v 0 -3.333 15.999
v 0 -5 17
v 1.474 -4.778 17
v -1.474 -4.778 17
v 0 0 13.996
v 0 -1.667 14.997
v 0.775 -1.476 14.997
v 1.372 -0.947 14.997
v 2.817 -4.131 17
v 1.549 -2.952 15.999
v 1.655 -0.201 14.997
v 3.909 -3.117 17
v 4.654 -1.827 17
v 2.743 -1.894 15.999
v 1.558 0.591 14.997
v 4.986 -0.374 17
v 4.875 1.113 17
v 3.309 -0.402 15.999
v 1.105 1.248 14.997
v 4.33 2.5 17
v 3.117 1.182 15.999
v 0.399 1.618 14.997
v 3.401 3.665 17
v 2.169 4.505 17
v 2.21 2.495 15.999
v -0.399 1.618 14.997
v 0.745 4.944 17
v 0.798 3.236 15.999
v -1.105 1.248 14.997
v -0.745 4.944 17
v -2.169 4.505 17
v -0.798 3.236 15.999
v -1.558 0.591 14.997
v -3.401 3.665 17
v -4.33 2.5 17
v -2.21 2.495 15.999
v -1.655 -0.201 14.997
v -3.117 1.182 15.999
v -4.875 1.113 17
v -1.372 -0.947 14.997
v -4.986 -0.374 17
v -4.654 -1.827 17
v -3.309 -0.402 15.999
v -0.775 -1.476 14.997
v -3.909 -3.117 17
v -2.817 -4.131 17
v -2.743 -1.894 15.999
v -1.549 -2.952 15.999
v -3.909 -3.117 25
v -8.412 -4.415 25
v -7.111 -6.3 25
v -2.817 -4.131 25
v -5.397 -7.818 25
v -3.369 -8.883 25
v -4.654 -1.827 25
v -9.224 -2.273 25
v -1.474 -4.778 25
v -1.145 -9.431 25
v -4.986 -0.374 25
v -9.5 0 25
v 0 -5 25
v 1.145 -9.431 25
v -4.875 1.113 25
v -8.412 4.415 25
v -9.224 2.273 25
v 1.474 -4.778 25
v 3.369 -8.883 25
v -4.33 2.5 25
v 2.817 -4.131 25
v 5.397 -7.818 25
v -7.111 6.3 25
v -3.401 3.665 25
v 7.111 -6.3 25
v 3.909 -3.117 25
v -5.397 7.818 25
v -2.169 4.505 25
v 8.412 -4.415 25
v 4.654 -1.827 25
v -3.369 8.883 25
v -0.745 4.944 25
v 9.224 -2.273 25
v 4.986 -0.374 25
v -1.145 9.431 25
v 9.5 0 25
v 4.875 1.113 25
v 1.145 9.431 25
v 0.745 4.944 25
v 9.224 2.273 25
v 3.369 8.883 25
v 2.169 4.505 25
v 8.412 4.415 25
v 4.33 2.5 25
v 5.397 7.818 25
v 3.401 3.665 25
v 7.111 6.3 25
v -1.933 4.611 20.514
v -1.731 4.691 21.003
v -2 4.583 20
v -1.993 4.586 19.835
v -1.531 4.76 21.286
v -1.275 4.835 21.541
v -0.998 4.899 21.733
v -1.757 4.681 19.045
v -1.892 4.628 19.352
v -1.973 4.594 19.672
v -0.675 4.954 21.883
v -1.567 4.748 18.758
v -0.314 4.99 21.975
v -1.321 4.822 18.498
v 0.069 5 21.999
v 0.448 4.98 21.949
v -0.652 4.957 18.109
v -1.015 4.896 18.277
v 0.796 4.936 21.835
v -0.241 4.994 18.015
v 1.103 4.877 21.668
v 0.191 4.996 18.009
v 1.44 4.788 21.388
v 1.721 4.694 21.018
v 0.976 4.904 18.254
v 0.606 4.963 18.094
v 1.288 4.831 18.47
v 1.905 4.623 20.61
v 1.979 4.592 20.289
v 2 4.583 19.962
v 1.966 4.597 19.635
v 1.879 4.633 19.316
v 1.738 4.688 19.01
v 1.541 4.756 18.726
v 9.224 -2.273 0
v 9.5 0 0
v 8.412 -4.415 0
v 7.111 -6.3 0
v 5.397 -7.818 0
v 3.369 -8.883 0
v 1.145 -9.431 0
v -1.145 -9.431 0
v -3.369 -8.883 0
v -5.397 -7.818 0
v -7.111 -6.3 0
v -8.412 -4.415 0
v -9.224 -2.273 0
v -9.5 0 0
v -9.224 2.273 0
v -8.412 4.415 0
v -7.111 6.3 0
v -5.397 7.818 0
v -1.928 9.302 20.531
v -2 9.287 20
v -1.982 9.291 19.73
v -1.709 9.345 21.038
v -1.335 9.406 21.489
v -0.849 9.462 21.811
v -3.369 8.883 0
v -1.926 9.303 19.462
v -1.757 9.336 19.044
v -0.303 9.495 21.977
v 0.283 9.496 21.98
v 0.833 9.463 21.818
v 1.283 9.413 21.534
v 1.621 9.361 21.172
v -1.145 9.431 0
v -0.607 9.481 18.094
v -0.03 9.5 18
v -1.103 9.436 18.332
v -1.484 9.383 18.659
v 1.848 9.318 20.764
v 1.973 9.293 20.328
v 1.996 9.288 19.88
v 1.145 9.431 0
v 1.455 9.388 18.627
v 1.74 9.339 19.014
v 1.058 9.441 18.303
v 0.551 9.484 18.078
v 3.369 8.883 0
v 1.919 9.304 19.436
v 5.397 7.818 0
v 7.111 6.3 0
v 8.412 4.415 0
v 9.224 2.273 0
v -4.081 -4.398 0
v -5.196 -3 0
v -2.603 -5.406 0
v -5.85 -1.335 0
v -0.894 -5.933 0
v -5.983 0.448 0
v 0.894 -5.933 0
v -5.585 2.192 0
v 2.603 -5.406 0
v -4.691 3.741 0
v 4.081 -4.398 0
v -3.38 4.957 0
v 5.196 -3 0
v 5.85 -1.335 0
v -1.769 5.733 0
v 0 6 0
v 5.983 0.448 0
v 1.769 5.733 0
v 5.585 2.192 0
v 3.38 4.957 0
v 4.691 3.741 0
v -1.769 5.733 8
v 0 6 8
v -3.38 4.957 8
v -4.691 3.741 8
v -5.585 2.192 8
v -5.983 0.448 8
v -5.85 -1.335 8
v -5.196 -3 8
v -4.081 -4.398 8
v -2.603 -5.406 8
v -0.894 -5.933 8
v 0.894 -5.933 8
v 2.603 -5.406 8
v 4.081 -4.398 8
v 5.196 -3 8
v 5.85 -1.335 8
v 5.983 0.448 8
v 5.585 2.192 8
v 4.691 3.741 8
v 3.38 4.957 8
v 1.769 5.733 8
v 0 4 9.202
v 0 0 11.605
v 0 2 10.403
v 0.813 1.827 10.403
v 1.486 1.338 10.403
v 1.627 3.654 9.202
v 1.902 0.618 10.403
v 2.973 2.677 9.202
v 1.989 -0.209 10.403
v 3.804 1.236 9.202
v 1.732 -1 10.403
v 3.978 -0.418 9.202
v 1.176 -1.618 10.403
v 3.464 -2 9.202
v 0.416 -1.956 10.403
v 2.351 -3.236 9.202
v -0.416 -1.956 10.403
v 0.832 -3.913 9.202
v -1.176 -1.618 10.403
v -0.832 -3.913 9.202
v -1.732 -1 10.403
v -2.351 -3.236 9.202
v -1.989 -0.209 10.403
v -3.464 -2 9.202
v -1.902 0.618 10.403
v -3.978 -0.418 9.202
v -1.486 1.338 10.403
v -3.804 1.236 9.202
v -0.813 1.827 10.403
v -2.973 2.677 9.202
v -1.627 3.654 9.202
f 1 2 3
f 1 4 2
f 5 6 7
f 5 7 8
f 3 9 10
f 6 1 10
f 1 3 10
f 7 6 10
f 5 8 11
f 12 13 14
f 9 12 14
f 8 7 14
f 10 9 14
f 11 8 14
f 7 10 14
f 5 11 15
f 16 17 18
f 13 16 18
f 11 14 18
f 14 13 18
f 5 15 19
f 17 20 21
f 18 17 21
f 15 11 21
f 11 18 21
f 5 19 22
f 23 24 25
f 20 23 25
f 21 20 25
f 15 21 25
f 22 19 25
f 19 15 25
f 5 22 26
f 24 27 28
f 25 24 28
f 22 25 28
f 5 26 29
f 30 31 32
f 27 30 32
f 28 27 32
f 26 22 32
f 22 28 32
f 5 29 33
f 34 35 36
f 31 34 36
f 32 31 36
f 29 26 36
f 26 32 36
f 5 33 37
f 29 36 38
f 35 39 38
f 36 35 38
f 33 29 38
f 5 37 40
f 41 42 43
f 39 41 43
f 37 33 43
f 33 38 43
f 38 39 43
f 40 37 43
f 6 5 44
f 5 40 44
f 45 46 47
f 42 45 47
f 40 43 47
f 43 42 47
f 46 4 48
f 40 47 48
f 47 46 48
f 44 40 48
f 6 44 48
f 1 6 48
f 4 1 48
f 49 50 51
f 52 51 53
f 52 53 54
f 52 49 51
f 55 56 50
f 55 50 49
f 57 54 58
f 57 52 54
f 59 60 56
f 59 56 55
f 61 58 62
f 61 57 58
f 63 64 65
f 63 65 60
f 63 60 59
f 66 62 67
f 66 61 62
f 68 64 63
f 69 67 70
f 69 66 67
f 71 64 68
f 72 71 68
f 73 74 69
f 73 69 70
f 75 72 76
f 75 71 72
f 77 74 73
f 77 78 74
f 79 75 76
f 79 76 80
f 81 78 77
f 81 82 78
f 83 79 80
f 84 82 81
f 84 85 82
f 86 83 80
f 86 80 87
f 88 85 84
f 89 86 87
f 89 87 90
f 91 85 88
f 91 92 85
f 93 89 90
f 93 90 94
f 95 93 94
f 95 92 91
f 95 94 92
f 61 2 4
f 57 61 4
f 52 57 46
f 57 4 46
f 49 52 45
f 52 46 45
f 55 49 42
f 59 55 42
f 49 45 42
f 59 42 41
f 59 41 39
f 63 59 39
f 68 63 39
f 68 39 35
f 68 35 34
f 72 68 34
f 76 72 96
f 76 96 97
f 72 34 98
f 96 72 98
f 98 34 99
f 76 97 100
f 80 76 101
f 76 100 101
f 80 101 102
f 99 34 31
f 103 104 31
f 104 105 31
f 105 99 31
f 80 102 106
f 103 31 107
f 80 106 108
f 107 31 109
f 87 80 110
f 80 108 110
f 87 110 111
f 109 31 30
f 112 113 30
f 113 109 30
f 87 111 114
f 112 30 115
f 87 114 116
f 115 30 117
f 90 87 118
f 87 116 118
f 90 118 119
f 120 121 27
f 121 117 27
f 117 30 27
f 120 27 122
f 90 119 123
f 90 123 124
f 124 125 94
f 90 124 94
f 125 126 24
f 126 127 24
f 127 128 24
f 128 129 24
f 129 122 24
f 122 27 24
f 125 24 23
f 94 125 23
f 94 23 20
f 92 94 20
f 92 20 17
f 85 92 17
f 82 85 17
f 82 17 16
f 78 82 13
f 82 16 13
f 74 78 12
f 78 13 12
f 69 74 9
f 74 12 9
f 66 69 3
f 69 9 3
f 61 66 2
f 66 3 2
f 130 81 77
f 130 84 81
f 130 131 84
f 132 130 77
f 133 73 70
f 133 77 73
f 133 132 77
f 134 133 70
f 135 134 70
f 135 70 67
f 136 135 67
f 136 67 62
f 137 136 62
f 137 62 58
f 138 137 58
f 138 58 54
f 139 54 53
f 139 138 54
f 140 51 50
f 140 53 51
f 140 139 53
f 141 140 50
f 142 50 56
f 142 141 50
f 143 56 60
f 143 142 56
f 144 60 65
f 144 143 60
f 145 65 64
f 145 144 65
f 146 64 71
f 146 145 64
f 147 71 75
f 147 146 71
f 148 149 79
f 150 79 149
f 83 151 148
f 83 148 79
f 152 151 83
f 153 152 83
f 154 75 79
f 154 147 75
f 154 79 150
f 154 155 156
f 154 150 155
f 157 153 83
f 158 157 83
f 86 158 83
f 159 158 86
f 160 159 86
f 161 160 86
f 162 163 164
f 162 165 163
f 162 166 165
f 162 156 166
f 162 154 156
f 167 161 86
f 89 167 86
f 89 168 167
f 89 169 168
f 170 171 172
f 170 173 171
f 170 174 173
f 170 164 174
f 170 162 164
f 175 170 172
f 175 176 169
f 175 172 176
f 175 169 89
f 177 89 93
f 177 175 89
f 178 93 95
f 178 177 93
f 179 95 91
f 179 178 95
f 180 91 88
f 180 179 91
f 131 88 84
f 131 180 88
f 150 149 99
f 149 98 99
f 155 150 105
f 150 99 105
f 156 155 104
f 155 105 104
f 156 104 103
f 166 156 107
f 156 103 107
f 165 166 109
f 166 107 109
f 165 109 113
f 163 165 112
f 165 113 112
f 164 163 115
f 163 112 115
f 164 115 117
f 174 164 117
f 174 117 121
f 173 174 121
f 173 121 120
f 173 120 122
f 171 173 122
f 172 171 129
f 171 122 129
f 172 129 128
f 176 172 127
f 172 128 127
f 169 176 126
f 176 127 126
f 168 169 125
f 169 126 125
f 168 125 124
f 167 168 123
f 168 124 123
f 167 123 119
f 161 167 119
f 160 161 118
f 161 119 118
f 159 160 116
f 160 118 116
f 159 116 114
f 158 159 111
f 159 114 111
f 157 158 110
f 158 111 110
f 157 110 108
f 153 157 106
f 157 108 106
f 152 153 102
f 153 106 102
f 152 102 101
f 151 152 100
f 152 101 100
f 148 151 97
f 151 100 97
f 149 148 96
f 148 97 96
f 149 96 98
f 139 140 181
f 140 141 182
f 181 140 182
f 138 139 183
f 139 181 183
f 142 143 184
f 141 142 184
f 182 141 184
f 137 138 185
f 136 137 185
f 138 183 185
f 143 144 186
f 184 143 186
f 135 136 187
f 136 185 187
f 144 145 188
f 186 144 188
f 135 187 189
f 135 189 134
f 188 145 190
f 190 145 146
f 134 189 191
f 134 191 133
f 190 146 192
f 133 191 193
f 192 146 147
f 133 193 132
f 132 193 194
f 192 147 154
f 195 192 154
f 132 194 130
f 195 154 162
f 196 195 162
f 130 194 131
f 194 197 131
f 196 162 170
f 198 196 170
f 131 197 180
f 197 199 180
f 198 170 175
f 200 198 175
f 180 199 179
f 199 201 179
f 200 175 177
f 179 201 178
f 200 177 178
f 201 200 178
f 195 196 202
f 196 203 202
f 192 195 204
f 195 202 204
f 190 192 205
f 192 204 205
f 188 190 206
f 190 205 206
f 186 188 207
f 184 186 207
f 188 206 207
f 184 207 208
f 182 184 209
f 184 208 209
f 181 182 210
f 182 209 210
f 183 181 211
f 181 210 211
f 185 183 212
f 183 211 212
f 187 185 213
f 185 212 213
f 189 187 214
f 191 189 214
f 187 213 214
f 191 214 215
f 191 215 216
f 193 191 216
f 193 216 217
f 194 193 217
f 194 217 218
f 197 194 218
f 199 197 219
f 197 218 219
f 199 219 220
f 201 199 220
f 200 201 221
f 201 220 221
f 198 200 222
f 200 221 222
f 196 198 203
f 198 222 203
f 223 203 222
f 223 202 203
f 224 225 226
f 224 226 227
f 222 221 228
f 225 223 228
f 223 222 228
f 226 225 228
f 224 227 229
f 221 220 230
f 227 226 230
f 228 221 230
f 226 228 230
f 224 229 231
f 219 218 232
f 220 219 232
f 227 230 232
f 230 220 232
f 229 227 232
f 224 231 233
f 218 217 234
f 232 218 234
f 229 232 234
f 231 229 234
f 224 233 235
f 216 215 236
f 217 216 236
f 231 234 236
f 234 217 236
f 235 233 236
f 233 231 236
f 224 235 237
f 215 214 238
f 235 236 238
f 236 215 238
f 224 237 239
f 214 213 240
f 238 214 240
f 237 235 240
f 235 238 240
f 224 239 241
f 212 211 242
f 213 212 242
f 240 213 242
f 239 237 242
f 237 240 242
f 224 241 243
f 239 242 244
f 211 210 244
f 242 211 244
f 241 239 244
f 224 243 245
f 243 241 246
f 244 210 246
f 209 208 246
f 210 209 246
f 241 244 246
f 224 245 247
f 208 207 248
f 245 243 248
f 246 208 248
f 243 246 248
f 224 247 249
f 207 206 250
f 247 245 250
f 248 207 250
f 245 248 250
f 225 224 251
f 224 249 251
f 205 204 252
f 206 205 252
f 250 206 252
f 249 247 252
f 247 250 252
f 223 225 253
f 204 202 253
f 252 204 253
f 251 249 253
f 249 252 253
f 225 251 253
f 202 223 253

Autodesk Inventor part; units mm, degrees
ref_plane "YZ Plane" through (0, 0, 0) normal (1, 0, 0) x (0, 1, 0)
ref_plane "XZ Plane" through (0, 0, 0) normal (0, 1, 0) x (-1, 0, 0)
ref_plane "XY Plane" through (0, 0, 0) normal (0, 0, 1) x (1, 0, 0)
sketch "Sketch1" plane through (0, 0, 0) normal (0, 0, 1) x (1, 0, 0)
  circle A0 centre (0, 0) radius 9.5
  dimension "d0" = 19
extrude "Extrusion1" add sketch "Sketch1" along normal blind 25
sketch "Sketch2" plane through (0, 0, 25) normal (0, 0, 1) x (1, 0, 0)
  point P0 (0, 0)
  point P1 (0, 0)
hole "Hole1" at (0, 0, 25) direction (0, 0, -1) diameter 10 depth 8 tip angle 118
sketch "Sketch3" plane through (0, 0, 0) normal (0, 0, -1) x (-1, 0, 0)
  point P0 (0, 0)
  point P1 (0, 0)
hole "Hole2" at (0, 0, 0) direction (0, 0, 1) diameter 12 depth 8 tip angle 118
sketch "Sketch4" plane through (0, 0, 0) normal (0, 1, 0) x (-1, 0, 0)
  line L0 (9.5, 25) -> (-9.5, 25) projected
  circle A0 centre (0, 20) radius 2
  point P0 (0, 0)
  dimension "d17" = 5
  dimension "d18" = 4
extrude "Extrusion2" cut sketch "Sketch4" along normal through all
properties part number "handleAdapter"
